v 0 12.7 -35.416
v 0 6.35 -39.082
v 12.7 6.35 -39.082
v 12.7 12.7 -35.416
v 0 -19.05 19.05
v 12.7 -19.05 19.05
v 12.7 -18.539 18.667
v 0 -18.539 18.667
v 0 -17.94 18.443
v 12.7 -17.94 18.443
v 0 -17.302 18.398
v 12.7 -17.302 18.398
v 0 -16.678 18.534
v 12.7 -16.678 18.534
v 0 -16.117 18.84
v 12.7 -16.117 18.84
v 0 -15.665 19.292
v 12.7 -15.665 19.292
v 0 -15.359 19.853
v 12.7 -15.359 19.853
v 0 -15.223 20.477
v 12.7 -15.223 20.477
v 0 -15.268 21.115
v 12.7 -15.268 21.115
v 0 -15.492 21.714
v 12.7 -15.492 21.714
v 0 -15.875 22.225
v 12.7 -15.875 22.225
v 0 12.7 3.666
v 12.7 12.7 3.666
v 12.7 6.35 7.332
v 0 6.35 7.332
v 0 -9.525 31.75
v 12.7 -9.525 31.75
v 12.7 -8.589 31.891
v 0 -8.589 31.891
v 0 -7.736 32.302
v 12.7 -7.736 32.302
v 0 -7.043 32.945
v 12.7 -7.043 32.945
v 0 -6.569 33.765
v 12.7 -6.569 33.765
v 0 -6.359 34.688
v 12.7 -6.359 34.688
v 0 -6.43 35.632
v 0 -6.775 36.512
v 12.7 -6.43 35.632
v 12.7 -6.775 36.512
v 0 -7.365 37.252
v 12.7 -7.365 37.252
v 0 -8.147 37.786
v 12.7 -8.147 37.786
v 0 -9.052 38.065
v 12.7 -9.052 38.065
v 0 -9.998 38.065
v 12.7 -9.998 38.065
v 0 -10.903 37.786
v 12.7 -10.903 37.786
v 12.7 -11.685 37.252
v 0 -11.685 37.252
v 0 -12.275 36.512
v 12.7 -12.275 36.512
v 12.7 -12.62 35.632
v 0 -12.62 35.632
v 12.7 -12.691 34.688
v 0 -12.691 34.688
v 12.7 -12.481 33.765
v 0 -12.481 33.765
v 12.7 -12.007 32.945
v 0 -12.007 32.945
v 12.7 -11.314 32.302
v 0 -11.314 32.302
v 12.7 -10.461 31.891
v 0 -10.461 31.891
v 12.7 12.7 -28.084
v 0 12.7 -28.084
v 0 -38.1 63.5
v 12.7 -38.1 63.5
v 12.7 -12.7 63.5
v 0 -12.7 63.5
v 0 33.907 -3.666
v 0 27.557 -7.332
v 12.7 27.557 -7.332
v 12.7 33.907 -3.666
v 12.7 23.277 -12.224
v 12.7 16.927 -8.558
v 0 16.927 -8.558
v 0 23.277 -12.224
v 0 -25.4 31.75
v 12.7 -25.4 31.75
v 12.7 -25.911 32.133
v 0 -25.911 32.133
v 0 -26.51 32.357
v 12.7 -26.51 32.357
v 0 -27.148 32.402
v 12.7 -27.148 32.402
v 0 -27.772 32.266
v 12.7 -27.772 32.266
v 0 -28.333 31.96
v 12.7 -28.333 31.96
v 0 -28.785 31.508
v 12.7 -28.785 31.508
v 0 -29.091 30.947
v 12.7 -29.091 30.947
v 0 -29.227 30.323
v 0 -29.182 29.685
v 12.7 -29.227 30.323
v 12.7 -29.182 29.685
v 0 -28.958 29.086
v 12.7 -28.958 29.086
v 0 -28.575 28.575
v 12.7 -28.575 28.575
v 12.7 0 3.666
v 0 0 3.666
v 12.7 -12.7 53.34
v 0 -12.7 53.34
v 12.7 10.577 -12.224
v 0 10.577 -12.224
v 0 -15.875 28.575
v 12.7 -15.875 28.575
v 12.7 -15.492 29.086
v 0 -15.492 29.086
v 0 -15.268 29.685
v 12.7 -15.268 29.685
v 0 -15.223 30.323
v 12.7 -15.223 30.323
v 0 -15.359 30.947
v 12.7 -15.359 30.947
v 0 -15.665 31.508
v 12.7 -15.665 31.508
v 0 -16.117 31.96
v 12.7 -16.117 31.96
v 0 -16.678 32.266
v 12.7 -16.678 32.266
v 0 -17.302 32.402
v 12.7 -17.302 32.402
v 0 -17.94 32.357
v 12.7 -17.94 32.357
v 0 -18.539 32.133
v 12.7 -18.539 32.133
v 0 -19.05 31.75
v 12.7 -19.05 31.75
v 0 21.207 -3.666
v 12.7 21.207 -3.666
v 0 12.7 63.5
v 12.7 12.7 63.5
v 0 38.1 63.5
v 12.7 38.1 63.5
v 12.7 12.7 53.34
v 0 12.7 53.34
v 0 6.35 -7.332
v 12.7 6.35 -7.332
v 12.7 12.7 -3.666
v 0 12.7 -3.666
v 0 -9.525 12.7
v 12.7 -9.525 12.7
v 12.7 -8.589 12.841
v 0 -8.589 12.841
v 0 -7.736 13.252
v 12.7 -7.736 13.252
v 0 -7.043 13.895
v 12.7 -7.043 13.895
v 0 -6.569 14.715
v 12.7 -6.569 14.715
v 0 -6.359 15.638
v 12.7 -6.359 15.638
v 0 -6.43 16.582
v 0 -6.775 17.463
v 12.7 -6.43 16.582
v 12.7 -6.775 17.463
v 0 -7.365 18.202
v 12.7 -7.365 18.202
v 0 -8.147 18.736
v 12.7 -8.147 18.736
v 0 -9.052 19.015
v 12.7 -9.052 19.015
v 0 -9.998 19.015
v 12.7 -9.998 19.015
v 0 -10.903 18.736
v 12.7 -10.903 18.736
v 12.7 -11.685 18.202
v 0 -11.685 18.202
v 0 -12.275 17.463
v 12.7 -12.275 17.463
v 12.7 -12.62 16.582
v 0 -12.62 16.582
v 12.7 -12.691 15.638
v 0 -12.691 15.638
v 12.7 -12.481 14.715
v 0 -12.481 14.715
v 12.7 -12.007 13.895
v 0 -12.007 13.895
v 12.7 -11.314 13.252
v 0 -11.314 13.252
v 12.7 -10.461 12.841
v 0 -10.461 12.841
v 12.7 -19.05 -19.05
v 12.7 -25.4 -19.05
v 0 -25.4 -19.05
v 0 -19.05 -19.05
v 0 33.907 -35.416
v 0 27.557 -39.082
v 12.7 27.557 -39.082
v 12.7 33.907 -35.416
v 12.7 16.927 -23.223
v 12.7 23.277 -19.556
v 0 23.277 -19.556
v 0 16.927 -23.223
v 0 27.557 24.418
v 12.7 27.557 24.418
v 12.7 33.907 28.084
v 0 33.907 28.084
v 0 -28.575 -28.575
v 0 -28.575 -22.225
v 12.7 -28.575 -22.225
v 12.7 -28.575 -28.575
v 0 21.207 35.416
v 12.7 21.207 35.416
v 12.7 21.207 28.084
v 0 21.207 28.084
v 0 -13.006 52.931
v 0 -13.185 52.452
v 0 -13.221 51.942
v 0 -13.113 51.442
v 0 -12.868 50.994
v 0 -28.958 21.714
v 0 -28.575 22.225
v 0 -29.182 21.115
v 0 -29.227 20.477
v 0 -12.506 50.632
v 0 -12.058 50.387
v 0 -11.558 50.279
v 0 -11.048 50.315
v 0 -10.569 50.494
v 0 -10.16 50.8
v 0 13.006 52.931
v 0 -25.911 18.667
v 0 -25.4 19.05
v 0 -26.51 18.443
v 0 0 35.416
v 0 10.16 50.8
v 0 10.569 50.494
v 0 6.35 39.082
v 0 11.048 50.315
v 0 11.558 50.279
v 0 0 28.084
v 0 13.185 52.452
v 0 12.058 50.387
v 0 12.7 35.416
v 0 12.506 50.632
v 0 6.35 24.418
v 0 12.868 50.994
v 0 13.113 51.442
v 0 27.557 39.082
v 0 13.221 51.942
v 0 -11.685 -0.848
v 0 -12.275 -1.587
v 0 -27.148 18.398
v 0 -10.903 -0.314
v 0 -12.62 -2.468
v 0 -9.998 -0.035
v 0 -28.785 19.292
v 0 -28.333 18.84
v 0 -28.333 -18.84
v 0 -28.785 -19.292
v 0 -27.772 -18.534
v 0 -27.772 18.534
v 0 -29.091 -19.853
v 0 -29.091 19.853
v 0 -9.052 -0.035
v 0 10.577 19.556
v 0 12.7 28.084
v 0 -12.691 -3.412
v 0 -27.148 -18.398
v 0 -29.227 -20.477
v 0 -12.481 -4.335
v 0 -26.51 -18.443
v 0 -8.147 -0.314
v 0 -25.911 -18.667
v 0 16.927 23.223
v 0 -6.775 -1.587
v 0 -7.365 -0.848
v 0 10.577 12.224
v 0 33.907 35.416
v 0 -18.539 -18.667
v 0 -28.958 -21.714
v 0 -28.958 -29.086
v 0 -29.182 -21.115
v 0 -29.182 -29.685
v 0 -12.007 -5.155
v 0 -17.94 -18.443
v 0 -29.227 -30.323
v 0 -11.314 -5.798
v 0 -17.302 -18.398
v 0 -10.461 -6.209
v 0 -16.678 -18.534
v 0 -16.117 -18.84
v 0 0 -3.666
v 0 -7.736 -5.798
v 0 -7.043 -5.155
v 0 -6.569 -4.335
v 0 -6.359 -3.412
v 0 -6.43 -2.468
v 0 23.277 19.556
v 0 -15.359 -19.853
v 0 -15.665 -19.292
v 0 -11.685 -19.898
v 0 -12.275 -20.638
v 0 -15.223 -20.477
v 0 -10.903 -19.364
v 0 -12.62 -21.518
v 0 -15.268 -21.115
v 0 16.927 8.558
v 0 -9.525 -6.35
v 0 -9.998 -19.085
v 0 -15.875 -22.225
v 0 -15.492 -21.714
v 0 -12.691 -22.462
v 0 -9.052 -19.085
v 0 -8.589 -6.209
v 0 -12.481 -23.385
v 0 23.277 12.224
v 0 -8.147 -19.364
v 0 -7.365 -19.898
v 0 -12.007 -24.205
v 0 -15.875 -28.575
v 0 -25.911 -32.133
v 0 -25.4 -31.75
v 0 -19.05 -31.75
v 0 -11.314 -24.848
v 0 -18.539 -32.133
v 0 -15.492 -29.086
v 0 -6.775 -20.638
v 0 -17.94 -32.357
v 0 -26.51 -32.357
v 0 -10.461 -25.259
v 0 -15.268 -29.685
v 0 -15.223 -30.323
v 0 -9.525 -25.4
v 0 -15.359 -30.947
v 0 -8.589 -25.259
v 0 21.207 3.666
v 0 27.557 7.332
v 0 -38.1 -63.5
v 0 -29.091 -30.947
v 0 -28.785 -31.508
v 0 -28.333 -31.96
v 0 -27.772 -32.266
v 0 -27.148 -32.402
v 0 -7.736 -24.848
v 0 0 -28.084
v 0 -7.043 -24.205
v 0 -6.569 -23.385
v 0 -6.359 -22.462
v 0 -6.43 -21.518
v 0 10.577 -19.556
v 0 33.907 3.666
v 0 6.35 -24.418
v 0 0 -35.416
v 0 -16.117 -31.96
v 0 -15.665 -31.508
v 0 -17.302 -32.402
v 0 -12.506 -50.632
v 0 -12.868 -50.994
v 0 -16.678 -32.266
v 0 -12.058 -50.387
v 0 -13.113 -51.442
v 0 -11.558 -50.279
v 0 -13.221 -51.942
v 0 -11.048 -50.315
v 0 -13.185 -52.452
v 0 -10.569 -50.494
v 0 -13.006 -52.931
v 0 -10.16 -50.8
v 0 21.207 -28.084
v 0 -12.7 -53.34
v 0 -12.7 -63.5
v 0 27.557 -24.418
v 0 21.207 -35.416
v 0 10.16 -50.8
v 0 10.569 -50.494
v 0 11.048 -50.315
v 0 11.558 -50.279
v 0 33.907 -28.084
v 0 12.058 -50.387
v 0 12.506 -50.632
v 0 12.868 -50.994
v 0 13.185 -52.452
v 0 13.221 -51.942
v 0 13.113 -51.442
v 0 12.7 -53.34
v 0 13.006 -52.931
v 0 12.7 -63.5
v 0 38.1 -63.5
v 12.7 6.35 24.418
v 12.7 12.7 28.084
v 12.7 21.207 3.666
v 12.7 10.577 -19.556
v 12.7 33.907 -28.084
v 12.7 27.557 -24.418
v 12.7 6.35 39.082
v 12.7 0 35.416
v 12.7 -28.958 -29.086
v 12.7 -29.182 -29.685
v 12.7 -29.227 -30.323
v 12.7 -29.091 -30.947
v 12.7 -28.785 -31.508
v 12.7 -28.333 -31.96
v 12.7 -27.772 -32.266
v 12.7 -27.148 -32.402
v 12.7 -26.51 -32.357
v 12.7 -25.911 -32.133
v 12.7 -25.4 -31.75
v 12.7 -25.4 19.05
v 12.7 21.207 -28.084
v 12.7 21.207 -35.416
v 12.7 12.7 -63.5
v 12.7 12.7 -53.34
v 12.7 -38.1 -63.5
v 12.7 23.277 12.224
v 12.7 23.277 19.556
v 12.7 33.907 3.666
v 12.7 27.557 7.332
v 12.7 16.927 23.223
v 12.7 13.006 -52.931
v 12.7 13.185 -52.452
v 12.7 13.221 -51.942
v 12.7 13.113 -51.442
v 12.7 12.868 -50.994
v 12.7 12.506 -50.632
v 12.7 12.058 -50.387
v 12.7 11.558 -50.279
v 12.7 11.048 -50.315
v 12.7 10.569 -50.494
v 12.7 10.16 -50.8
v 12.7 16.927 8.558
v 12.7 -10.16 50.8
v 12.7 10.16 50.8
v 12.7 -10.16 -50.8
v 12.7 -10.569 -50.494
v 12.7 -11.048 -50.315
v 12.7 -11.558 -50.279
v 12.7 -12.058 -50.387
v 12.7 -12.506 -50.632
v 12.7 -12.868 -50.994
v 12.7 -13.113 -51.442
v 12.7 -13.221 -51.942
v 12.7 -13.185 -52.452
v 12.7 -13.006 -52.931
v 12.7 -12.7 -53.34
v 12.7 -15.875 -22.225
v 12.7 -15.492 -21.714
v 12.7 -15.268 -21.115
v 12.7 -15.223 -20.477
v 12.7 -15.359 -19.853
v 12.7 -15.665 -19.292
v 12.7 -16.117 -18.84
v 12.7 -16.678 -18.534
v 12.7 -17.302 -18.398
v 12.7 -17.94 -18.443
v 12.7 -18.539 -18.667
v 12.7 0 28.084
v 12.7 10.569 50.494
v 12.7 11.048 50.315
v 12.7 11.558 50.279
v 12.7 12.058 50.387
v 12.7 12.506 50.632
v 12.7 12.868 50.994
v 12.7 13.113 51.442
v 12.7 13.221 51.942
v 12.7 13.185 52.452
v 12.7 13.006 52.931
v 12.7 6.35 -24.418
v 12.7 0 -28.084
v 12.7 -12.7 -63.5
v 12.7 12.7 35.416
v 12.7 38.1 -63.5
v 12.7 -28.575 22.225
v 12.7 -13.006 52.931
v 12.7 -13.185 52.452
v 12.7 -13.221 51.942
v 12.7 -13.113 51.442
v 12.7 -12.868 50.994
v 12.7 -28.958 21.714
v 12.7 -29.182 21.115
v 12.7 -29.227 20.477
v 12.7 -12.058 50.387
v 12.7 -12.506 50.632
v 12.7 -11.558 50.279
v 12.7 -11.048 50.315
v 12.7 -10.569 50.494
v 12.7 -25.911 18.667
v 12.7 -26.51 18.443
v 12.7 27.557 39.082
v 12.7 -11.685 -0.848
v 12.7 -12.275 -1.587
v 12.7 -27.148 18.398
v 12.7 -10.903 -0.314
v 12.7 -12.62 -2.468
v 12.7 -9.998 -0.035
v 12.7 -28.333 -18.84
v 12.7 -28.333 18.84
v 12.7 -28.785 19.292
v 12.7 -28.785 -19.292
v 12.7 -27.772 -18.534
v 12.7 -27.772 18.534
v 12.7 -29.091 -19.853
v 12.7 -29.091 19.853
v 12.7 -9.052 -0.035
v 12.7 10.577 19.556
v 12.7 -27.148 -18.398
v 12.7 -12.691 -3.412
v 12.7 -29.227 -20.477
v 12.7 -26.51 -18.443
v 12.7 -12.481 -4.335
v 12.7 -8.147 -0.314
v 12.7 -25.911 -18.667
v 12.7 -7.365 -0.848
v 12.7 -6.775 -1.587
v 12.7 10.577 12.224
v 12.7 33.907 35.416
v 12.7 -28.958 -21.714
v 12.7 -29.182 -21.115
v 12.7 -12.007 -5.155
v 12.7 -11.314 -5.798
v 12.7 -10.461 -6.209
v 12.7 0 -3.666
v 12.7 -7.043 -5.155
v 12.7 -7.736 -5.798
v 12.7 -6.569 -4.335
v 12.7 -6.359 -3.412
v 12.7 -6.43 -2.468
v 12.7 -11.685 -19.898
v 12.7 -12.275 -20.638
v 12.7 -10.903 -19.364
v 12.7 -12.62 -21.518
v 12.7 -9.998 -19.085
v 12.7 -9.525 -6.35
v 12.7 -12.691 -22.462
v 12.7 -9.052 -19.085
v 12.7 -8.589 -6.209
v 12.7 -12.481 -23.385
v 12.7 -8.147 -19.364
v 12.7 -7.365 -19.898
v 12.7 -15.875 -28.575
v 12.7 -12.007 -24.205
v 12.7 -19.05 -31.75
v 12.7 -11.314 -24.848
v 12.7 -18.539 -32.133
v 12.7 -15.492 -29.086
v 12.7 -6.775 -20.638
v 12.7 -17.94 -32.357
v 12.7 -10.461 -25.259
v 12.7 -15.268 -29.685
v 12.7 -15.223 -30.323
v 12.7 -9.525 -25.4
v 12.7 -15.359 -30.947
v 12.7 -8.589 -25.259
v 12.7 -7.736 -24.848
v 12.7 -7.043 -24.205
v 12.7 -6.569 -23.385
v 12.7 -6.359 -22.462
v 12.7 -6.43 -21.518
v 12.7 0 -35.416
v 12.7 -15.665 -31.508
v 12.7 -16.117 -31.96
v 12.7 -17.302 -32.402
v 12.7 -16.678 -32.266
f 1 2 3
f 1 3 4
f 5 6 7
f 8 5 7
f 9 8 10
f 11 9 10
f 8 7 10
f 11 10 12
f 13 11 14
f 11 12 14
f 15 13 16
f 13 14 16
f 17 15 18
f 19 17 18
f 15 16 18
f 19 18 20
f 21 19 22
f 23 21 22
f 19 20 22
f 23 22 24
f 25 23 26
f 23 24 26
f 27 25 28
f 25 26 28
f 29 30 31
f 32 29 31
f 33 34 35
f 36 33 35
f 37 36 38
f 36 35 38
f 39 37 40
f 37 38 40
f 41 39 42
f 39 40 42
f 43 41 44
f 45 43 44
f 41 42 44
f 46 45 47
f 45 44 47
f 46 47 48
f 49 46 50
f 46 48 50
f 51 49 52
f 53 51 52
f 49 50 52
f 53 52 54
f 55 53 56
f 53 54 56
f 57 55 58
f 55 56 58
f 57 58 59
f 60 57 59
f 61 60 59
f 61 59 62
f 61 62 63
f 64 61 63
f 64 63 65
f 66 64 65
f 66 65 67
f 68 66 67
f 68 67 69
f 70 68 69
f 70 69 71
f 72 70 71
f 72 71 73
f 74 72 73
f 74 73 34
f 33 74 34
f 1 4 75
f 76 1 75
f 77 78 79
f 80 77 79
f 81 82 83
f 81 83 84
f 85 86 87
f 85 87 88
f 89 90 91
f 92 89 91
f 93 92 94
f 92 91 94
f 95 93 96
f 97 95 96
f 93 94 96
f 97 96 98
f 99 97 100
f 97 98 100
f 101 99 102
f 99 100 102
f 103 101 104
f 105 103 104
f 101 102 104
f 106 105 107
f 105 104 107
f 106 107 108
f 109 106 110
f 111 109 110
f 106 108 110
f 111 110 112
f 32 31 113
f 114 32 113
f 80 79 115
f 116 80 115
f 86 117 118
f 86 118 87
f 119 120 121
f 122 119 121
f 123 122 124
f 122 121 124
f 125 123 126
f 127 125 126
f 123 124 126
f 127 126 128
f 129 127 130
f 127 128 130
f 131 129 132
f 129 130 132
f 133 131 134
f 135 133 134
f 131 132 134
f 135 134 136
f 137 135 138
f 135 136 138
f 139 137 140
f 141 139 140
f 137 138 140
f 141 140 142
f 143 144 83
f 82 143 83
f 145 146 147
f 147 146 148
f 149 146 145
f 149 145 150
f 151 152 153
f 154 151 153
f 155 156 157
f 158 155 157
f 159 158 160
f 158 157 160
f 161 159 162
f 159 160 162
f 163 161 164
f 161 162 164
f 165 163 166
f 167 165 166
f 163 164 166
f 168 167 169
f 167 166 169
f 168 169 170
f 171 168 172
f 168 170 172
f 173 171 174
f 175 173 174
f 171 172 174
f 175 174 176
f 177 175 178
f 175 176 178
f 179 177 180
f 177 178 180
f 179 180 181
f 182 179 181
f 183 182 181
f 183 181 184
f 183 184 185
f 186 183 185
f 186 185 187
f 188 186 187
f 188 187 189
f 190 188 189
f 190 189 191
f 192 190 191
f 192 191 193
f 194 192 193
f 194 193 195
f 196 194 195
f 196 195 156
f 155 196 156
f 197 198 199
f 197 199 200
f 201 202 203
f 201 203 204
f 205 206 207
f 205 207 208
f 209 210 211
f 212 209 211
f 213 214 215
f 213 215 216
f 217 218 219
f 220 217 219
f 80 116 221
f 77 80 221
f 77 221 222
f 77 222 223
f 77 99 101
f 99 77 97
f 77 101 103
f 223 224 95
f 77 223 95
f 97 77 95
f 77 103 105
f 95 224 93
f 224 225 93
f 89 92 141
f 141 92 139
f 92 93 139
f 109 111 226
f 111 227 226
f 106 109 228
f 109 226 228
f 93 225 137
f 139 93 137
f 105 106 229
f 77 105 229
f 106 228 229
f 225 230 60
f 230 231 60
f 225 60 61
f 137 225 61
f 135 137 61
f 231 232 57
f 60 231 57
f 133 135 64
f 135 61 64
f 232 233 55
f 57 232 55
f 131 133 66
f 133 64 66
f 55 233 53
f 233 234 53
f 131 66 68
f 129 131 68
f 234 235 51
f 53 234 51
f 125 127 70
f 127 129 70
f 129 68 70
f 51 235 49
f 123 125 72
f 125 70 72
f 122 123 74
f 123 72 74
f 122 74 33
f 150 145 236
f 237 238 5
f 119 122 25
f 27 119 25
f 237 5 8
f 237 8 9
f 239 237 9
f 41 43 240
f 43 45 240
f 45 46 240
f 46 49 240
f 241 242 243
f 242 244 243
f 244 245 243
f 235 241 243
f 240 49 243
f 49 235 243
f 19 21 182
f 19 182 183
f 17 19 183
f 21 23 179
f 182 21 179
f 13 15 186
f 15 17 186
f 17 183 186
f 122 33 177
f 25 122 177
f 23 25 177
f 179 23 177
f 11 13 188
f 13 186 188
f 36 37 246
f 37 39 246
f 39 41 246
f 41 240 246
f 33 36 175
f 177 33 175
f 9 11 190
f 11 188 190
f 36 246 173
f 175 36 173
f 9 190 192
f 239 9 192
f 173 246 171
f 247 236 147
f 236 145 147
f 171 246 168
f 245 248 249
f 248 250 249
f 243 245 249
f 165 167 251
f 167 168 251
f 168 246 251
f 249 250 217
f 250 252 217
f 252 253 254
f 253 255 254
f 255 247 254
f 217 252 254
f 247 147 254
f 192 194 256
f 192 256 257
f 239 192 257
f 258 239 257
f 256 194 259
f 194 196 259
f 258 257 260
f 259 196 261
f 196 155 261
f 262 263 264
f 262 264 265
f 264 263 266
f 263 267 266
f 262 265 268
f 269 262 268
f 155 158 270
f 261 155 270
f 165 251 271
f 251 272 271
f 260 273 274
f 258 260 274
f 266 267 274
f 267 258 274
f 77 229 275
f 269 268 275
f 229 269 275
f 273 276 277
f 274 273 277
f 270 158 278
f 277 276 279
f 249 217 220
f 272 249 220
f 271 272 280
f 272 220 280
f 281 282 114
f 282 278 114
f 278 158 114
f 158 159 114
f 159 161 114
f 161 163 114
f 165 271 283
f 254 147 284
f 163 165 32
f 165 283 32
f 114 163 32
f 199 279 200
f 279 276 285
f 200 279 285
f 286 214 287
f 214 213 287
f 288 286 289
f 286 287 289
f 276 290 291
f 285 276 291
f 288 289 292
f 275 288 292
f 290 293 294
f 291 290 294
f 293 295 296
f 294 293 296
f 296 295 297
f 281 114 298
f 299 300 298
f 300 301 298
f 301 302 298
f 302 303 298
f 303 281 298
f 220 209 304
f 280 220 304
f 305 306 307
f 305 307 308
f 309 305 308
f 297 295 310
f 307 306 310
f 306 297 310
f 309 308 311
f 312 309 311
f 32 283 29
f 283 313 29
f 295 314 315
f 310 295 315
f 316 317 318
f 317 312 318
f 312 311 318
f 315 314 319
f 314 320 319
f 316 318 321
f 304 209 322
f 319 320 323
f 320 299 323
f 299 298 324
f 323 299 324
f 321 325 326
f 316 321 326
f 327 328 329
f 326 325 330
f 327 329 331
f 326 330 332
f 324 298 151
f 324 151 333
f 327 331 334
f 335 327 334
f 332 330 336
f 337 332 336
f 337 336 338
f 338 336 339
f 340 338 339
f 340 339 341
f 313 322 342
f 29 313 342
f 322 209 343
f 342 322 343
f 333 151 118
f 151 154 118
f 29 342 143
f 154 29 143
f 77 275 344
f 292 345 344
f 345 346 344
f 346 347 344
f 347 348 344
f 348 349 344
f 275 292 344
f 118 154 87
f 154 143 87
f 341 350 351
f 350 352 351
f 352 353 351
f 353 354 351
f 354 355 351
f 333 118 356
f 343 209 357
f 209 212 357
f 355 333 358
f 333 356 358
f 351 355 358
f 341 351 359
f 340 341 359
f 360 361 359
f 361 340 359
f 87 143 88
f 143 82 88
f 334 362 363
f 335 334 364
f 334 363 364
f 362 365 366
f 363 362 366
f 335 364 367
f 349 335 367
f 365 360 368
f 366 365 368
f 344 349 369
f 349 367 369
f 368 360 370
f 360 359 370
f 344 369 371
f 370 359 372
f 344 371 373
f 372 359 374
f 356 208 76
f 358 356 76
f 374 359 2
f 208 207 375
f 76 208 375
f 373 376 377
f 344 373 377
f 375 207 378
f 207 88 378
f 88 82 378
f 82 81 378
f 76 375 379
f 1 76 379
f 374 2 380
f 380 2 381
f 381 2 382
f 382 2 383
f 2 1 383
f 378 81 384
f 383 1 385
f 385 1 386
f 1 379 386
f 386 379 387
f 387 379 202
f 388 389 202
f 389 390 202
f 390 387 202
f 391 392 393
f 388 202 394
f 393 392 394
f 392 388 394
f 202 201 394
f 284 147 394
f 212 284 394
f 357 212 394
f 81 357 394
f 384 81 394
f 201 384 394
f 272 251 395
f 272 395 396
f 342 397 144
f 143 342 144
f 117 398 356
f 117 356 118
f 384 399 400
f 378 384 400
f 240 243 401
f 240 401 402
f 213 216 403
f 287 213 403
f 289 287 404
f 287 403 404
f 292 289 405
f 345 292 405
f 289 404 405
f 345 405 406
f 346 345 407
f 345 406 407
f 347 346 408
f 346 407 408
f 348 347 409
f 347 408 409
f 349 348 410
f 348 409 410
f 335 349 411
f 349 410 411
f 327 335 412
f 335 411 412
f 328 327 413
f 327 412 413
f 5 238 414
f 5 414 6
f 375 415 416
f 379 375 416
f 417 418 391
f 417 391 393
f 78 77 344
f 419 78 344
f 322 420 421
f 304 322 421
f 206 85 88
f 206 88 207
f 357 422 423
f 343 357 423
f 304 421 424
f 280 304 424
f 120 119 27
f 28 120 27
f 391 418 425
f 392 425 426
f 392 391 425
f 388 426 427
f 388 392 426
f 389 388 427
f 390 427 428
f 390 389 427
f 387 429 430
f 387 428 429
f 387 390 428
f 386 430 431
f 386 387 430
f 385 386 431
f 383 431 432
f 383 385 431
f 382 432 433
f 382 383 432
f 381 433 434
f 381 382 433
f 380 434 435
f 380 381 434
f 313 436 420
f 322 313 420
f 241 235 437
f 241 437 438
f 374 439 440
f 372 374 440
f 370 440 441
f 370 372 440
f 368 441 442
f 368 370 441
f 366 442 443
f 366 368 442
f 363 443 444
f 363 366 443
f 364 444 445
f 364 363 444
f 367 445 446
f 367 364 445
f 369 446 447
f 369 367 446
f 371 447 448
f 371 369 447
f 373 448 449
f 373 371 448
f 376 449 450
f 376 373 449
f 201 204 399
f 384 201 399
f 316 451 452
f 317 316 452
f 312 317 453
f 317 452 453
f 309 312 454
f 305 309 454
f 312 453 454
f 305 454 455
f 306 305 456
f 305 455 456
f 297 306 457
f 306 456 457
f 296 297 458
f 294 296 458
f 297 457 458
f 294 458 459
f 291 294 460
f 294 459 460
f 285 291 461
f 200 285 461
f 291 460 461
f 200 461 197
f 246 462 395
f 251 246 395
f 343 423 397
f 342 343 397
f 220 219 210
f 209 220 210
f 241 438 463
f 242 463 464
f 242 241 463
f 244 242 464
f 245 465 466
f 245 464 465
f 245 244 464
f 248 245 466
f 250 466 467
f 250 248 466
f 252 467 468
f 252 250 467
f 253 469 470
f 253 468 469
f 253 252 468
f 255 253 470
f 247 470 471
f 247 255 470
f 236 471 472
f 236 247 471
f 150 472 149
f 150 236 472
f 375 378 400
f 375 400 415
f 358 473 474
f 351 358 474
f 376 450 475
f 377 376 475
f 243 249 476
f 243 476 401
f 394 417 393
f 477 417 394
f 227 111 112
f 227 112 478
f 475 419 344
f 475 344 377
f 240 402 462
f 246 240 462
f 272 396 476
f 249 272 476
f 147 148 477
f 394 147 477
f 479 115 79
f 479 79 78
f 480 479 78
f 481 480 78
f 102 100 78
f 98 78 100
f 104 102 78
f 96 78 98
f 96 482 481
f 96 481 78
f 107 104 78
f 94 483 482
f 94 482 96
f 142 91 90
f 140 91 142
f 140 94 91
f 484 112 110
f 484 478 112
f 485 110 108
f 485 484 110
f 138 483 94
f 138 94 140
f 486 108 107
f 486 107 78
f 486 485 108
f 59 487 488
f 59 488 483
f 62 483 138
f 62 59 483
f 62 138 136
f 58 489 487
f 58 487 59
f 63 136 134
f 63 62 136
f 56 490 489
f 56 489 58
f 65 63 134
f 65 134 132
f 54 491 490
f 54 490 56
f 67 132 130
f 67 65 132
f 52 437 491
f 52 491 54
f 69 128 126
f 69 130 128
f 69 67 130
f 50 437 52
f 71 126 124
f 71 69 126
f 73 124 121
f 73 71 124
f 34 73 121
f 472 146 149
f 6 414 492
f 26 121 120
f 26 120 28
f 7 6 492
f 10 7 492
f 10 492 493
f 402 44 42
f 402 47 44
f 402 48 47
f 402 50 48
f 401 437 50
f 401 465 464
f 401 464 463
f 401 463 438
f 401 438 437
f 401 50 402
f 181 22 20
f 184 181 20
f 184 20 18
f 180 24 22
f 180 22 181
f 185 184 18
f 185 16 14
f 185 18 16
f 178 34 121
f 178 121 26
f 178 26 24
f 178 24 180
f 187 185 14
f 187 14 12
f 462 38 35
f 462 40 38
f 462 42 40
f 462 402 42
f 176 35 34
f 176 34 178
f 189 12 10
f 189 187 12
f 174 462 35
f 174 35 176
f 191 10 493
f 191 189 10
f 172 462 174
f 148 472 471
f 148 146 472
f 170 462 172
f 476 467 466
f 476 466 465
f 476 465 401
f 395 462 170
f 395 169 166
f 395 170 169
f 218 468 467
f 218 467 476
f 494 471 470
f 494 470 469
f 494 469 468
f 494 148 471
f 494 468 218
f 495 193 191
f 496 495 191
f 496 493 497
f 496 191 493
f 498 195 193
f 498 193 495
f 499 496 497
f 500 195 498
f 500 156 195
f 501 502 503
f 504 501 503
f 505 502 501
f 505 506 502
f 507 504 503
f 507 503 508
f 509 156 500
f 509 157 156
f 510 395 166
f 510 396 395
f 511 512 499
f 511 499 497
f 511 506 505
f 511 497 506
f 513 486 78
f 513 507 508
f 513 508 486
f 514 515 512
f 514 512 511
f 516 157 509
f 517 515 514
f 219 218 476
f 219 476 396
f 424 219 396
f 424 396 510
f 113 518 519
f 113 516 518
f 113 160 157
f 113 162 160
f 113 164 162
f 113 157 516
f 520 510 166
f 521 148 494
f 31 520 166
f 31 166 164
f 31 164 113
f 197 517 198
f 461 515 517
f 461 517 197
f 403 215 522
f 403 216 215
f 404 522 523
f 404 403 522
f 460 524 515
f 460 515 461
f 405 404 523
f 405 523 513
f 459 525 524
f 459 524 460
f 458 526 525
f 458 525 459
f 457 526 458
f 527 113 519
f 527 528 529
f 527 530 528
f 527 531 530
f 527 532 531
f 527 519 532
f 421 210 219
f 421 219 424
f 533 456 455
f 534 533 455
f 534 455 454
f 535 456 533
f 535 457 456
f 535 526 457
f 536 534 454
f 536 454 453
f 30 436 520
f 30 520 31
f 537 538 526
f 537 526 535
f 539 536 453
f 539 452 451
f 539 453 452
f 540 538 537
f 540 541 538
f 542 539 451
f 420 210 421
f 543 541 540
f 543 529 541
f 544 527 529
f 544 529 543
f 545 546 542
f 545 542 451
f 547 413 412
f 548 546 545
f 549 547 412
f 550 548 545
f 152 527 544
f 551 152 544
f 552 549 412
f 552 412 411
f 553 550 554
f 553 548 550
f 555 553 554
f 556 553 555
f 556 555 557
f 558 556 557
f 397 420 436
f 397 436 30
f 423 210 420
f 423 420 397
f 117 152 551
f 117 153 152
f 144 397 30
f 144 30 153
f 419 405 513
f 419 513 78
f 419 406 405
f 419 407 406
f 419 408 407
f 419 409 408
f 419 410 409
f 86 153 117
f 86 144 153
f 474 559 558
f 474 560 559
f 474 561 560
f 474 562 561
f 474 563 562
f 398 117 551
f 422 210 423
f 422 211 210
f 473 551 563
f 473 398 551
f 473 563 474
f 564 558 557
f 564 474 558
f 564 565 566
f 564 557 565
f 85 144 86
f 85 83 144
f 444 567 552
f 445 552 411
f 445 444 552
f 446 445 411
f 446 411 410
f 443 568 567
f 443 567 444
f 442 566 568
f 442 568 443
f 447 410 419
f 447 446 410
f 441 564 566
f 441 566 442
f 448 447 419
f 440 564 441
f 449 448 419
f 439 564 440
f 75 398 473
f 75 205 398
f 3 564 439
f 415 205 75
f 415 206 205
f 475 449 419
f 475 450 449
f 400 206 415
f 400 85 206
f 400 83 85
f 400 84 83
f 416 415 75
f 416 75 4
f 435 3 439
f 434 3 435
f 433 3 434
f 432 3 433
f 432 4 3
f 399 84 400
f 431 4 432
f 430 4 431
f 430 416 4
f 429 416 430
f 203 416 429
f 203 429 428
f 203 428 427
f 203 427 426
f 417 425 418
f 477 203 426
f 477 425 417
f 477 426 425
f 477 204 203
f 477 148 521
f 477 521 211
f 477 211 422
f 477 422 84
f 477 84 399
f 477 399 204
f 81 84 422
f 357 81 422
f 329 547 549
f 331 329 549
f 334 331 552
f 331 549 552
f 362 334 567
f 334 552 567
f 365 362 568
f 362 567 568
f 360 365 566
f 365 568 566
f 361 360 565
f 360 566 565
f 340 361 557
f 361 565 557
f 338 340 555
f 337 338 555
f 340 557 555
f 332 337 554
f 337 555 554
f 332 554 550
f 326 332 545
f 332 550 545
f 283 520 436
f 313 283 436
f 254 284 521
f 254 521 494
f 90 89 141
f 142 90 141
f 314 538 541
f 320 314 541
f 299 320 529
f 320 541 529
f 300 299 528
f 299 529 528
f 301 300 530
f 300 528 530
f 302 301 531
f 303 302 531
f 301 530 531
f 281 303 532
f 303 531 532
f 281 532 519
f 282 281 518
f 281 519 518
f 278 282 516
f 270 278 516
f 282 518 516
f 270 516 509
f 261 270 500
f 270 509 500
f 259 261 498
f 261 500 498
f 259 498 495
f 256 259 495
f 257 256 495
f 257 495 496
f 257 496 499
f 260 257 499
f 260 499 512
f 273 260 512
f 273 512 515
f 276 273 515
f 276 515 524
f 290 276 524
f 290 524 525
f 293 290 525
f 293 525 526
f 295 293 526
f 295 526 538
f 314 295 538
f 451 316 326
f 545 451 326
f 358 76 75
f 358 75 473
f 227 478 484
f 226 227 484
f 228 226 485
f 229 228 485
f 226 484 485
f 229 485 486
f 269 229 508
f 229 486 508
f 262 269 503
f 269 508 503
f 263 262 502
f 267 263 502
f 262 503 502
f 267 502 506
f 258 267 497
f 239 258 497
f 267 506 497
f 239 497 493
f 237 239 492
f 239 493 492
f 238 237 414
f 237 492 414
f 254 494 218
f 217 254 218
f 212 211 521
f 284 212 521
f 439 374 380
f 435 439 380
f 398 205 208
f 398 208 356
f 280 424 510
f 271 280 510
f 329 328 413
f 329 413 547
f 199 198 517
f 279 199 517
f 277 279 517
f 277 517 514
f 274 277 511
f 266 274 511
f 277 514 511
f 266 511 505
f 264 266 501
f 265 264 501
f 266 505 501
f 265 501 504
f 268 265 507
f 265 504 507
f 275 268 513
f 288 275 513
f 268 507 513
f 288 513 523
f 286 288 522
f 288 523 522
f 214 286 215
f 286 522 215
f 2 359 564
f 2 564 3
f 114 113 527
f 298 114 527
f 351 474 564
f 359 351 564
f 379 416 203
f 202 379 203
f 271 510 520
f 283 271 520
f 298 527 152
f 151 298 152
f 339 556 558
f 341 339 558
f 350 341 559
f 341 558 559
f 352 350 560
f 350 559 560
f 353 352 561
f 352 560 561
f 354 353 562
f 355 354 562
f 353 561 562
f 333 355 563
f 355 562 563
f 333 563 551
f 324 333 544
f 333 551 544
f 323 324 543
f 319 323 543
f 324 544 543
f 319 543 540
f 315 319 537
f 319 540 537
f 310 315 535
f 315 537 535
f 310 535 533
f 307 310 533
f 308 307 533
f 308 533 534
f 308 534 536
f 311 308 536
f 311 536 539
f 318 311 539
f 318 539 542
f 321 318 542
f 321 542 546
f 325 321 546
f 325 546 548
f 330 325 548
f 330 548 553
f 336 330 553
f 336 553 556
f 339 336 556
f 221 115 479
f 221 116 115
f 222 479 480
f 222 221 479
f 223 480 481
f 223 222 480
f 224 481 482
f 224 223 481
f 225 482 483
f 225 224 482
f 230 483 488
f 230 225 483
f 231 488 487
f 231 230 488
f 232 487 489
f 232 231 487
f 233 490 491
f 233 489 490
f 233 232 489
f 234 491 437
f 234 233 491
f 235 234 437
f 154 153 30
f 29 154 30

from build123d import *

# Parameters (mm, degrees)
SKETCH3_W                 = 101.6
SKETCH3_H                 = 76.2
SQUARE_EXTRUSION_DEPTH    = 12.7
SKETCH4_R                 = 2.24536
SKETCH4_W                 = 12.7
SKETCH4_H                 = 12.7
SLOTTING_HOLES_DEPTH      = 12.7
HONEYCOMB_POCKETING_DEPTH = 12.7
SKETCH14_W                = 12.7
SKETCH14_H                = 25.4
TAB_EXTRUSION_DEPTH       = 12.7
CUT_EXTRUDE2_START        = -12.7
SKETCH15_R                = 1.796051224
CUT_EXTRUDE2_DEPTH        = 12.7
CUT_EXTRUDE3_REACH        = 77.134
SKETCH16_R                = 3.175


with BuildPart() as part:
    # Sketch3 → Square Extrusion (new body)
    with BuildSketch(Plane(origin=(0, 0, 0), x_dir=(0, 0, -1), z_dir=(1, 0, 0))):
        Rectangle(SKETCH3_W, SKETCH3_H)
    extrude(amount=SQUARE_EXTRUSION_DEPTH)

    # Sketch4 → Slotting Holes (cut)
    with BuildSketch(Plane(origin=(12.7, 0, 0), x_dir=(0, 0, -1), z_dir=(1, 0, 0))):
        with BuildLine():
            ThreePointArc((-28.574581463, -15.875), (-31.750209282, -15.874790718), (-31.75, -19.050418537))
            Line((-31.75, -19.050418537), (-31.75, -15.875))
            Line((-31.75, -15.875), (-28.574581463, -15.875))
        make_face()
        with BuildLine():
            Line((-31.75, -15.875), (-31.75, -19.050418537))
            ThreePointArc((-31.75, -19.050418537), (-29.303101219, -19.536885515), (-27.91714, -17.4625))
            ThreePointArc((-27.91714, -17.4625), (-28.08800123, -16.603374641), (-28.574581463, -15.875))
            Line((-28.574581463, -15.875), (-31.75, -15.875))
        make_face()
        with Locations((-30.1625, -26.9875)):
            Circle(SKETCH4_R)
        with Locations((-20.6375, -26.9875)):
            Circle(SKETCH4_R)
        with Locations((-20.6375, -17.4625)):
            Circle(SKETCH4_R)
        with Locations((-30.1625, -17.4625)):
            Circle(SKETCH4_R)
        with Locations((-25.4, -22.225)):
            Rectangle(SKETCH4_W, SKETCH4_H)
        with BuildLine():
            ThreePointArc((-22.225418537, -15.875), (-22.225209282, -19.050209282), (-19.05, -19.050418537))
            Line((-19.05, -19.050418537), (-19.05, -15.875))
            Line((-19.05, -15.875), (-22.225418537, -15.875))
        make_face()
        with BuildLine():
            Line((-19.05, -15.875), (-19.05, -19.050418537))
            ThreePointArc((-19.05, -19.050418537), (-18.563114485, -18.321898781), (-18.39214, -17.4625))
            ThreePointArc((-18.39214, -17.4625), (-19.778374641, -15.38800123), (-22.225418537, -15.875))
            Line((-22.225418537, -15.875), (-19.05, -15.875))
        make_face()
        with BuildLine():
            Line((-31.75, -25.399581463), (-31.75, -28.575))
            Line((-31.75, -28.575), (-28.574581463, -28.575))
            ThreePointArc((-28.574581463, -28.575), (-28.08800123, -27.846625359), (-27.91714, -26.9875))
            ThreePointArc((-27.91714, -26.9875), (-29.303101219, -24.913114485), (-31.75, -25.399581463))
        make_face()
        with BuildLine():
            Line((-28.574581463, -28.575), (-31.75, -28.575))
            Line((-31.75, -28.575), (-31.75, -25.399581463))
            ThreePointArc((-31.75, -25.399581463), (-31.750209282, -28.575209282), (-28.574581463, -28.575))
        make_face()
        with BuildLine():
            ThreePointArc((-19.05, -25.399581463), (-22.225209282, -25.399790718), (-22.225418537, -28.575))
            Line((-22.225418537, -28.575), (-19.05, -28.575))
            Line((-19.05, -28.575), (-19.05, -25.399581463))
        make_face()
        with BuildLine():
            Line((-19.05, -28.575), (-22.225418537, -28.575))
            ThreePointArc((-22.225418537, -28.575), (-19.778374641, -29.06199877), (-18.39214, -26.9875))
            ThreePointArc((-18.39214, -26.9875), (-18.563114485, -26.128101219), (-19.05, -25.399581463))
            Line((-19.05, -25.399581463), (-19.05, -28.575))
        make_face()
        with BuildLine():
            ThreePointArc((22.88286, -17.4625), (22.71199877, -16.603374641), (22.225418537, -15.875))
            Line((22.225418537, -15.875), (19.05, -15.875))
            Line((19.05, -15.875), (19.05, -19.050418537))
            ThreePointArc((19.05, -19.050418537), (21.496898781, -19.536885515), (22.88286, -17.4625))
        make_face()
        with BuildLine():
            Line((19.05, -15.875), (22.225418537, -15.875))
            ThreePointArc((22.225418537, -15.875), (19.049790718, -15.874790718), (19.05, -19.050418537))
            Line((19.05, -19.050418537), (19.05, -15.875))
        make_face()
        with Locations((30.1625, -17.4625)):
            Circle(SKETCH4_R)
        with Locations((20.6375, -17.4625)):
            Circle(SKETCH4_R)
        with Locations((20.6375, -26.9875)):
            Circle(SKETCH4_R)
        with Locations((30.1625, -26.9875)):
            Circle(SKETCH4_R)
        with Locations((25.4, -22.225)):
            Rectangle(SKETCH4_W, SKETCH4_H)
        with BuildLine():
            Line((31.75, -19.050418537), (31.75, -15.875))
            Line((31.75, -15.875), (28.574581463, -15.875))
            ThreePointArc((28.574581463, -15.875), (28.574790718, -19.050209282), (31.75, -19.050418537))
        make_face()
        with BuildLine():
            Line((28.574581463, -15.875), (31.75, -15.875))
            Line((31.75, -15.875), (31.75, -19.050418537))
            ThreePointArc((31.75, -19.050418537), (32.236885515, -18.321898781), (32.40786, -17.4625))
            ThreePointArc((32.40786, -17.4625), (31.021625359, -15.38800123), (28.574581463, -15.875))
        make_face()
        with BuildLine():
            ThreePointArc((32.40786, -26.9875), (32.236885515, -26.128101219), (31.75, -25.399581463))
            Line((31.75, -25.399581463), (31.75, -28.575))
            Line((31.75, -28.575), (28.574581463, -28.575))
            ThreePointArc((28.574581463, -28.575), (31.021625359, -29.06199877), (32.40786, -26.9875))
        make_face()
        with BuildLine():
            Line((31.75, -28.575), (31.75, -25.399581463))
            ThreePointArc((31.75, -25.399581463), (28.574790718, -25.399790718), (28.574581463, -28.575))
            Line((28.574581463, -28.575), (31.75, -28.575))
        make_face()
        with BuildLine():
            ThreePointArc((22.88286, -26.9875), (21.496898781, -24.913114485), (19.05, -25.399581463))
            Line((19.05, -25.399581463), (19.05, -28.575))
            Line((19.05, -28.575), (22.225418537, -28.575))
            ThreePointArc((22.225418537, -28.575), (22.71199877, -27.846625359), (22.88286, -26.9875))
        make_face()
        with BuildLine():
            Line((19.05, -28.575), (19.05, -25.399581463))
            ThreePointArc((19.05, -25.399581463), (19.049790718, -28.575209282), (22.225418537, -28.575))
            Line((22.225418537, -28.575), (19.05, -28.575))
        make_face()
    extrude(amount=-SLOTTING_HOLES_DEPTH, mode=Mode.SUBTRACT)

    # Sketch9 → Honeycomb Pocketing (cut)
    with BuildSketch(Plane(origin=(12.7, 0, 0), x_dir=(0, 0, -1), z_dir=(1, 0, 0))):
        Polygon((-35.416174209, 21.20738686), (-28.083825791, 21.20738686), (-24.417651581, 27.55738686), (-28.083825791, 33.90738686), (-35.416174209, 33.90738686), (-39.082348419, 27.55738686), align=None)
        Polygon((-3.666174209, 0), (3.666174209, 0), (7.332348419, 6.35), (3.666174209, 12.7), (-3.666174209, 12.7), (-7.332348419, 6.35), align=None)
        Polygon((-35.416174209, 0), (-28.083825791, 0), (-24.417651581, 6.35), (-28.083825791, 12.7), (-35.416174209, 12.7), (-39.082348419, 6.35), align=None)
        Polygon((28.083825791, 0), (35.416174209, 0), (39.082348419, 6.35), (35.416174209, 12.7), (28.083825791, 12.7), (24.417651581, 6.35), align=None)
        Polygon((-3.666174209, 21.20738686), (3.666174209, 21.20738686), (7.332348419, 27.55738686), (3.666174209, 33.90738686), (-3.666174209, 33.90738686), (-7.332348419, 27.55738686), align=None)
        Polygon((28.083825791, 21.20738686), (35.416174209, 21.20738686), (39.082348419, 27.55738686), (35.416174209, 33.90738686), (28.083825791, 33.90738686), (24.417651581, 27.55738686), align=None)
        Polygon((19.556437025, 10.577257458), (12.224088606, 10.577257458), (8.557914397, 16.927257458), (12.224088606, 23.277257458), (19.556437025, 23.277257458), (23.222611234, 16.927257458), align=None)
        Polygon((-12.224088606, 10.577257458), (-8.557914397, 16.927257458), (-12.224088606, 23.277257458), (-19.556437025, 23.277257458), (-23.222611234, 16.927257458), (-19.556437025, 10.577257458), align=None)
    extrude(amount=-HONEYCOMB_POCKETING_DEPTH, mode=Mode.SUBTRACT)

    # Sketch14 → Tab Extrusion (add)
    with BuildSketch(Plane(origin=(12.7, 0, 0), x_dir=(0, 0, -1), z_dir=(1, 0, 0))):
        with Locations((-57.15, 25.4)):
            Rectangle(SKETCH14_W, SKETCH14_H)
        with Locations((-57.15, -25.4)):
            Rectangle(SKETCH14_W, SKETCH14_H)
        with Locations((57.15, -25.4)):
            Rectangle(SKETCH14_W, SKETCH14_H)
        with Locations((57.15, 25.4)):
            Rectangle(SKETCH14_W, SKETCH14_H)
    extrude(amount=-TAB_EXTRUSION_DEPTH)

    # Sketch15 → Cut-Extrude2 (cut)
    with BuildSketch(Plane(origin=(12.7, 0, 0), x_dir=(0, 0, -1), z_dir=(1, 0, 0)).offset(CUT_EXTRUDE2_START)):
        with Locations((-52.07, 11.43)):
            Circle(SKETCH15_R)
        with Locations((-52.07, -11.43)):
            Circle(SKETCH15_R)
        with Locations((52.07, -11.43)):
            Circle(SKETCH15_R)
        with Locations((52.07, 11.43)):
            Circle(SKETCH15_R)
    extrude(amount=CUT_EXTRUDE2_DEPTH, mode=Mode.SUBTRACT)

    # Sketch16 → Cut-Extrude3 (cut, up to next)
    with BuildSketch(Plane(origin=(12.7, 0, 0), x_dir=(0, 0, -1), z_dir=(1, 0, 0)), mode=Mode.PRIVATE) as cut_extrude3_sk1:
        with Locations((-34.925, -9.525)):
            Circle(SKETCH16_R)
    cut_extrude3_tool1 = extrude(cut_extrude3_sk1.sketch, amount=-CUT_EXTRUDE3_REACH, mode=Mode.PRIVATE) & part.part
    # Sketch16 → Cut-Extrude3 (cut, up to next)
    with BuildSketch(Plane(origin=(12.7, 0, 0), x_dir=(0, 0, -1), z_dir=(1, 0, 0)), mode=Mode.PRIVATE) as cut_extrude3_sk2:
        with Locations((-15.875, -9.525)):
            Circle(SKETCH16_R)
    cut_extrude3_tool2 = extrude(cut_extrude3_sk2.sketch, amount=-CUT_EXTRUDE3_REACH, mode=Mode.PRIVATE) & part.part
    # Sketch16 → Cut-Extrude3 (cut, up to next)
    with BuildSketch(Plane(origin=(12.7, 0, 0), x_dir=(0, 0, -1), z_dir=(1, 0, 0)), mode=Mode.PRIVATE) as cut_extrude3_sk3:
        with Locations((3.175, -9.525)):
            Circle(SKETCH16_R)
    cut_extrude3_tool3 = extrude(cut_extrude3_sk3.sketch, amount=-CUT_EXTRUDE3_REACH, mode=Mode.PRIVATE) & part.part
    # Sketch16 → Cut-Extrude3 (cut, up to next)
    with BuildSketch(Plane(origin=(12.7, 0, 0), x_dir=(0, 0, -1), z_dir=(1, 0, 0)), mode=Mode.PRIVATE) as cut_extrude3_sk4:
        with Locations((22.225, -9.525)):
            Circle(SKETCH16_R)
    cut_extrude3_tool4 = extrude(cut_extrude3_sk4.sketch, amount=-CUT_EXTRUDE3_REACH, mode=Mode.PRIVATE) & part.part
    add(cut_extrude3_tool1.solids().sort_by_distance((12.7, -9.525, 34.925))[0], mode=Mode.SUBTRACT)
    add(cut_extrude3_tool2.solids().sort_by_distance((12.7, -9.525, 15.875))[0], mode=Mode.SUBTRACT)
    add(cut_extrude3_tool3.solids().sort_by_distance((12.7, -9.525, -3.175))[0], mode=Mode.SUBTRACT)
    add(cut_extrude3_tool4.solids().sort_by_distance((12.7, -9.525, -22.225))[0], mode=Mode.SUBTRACT)


solid = part.part
